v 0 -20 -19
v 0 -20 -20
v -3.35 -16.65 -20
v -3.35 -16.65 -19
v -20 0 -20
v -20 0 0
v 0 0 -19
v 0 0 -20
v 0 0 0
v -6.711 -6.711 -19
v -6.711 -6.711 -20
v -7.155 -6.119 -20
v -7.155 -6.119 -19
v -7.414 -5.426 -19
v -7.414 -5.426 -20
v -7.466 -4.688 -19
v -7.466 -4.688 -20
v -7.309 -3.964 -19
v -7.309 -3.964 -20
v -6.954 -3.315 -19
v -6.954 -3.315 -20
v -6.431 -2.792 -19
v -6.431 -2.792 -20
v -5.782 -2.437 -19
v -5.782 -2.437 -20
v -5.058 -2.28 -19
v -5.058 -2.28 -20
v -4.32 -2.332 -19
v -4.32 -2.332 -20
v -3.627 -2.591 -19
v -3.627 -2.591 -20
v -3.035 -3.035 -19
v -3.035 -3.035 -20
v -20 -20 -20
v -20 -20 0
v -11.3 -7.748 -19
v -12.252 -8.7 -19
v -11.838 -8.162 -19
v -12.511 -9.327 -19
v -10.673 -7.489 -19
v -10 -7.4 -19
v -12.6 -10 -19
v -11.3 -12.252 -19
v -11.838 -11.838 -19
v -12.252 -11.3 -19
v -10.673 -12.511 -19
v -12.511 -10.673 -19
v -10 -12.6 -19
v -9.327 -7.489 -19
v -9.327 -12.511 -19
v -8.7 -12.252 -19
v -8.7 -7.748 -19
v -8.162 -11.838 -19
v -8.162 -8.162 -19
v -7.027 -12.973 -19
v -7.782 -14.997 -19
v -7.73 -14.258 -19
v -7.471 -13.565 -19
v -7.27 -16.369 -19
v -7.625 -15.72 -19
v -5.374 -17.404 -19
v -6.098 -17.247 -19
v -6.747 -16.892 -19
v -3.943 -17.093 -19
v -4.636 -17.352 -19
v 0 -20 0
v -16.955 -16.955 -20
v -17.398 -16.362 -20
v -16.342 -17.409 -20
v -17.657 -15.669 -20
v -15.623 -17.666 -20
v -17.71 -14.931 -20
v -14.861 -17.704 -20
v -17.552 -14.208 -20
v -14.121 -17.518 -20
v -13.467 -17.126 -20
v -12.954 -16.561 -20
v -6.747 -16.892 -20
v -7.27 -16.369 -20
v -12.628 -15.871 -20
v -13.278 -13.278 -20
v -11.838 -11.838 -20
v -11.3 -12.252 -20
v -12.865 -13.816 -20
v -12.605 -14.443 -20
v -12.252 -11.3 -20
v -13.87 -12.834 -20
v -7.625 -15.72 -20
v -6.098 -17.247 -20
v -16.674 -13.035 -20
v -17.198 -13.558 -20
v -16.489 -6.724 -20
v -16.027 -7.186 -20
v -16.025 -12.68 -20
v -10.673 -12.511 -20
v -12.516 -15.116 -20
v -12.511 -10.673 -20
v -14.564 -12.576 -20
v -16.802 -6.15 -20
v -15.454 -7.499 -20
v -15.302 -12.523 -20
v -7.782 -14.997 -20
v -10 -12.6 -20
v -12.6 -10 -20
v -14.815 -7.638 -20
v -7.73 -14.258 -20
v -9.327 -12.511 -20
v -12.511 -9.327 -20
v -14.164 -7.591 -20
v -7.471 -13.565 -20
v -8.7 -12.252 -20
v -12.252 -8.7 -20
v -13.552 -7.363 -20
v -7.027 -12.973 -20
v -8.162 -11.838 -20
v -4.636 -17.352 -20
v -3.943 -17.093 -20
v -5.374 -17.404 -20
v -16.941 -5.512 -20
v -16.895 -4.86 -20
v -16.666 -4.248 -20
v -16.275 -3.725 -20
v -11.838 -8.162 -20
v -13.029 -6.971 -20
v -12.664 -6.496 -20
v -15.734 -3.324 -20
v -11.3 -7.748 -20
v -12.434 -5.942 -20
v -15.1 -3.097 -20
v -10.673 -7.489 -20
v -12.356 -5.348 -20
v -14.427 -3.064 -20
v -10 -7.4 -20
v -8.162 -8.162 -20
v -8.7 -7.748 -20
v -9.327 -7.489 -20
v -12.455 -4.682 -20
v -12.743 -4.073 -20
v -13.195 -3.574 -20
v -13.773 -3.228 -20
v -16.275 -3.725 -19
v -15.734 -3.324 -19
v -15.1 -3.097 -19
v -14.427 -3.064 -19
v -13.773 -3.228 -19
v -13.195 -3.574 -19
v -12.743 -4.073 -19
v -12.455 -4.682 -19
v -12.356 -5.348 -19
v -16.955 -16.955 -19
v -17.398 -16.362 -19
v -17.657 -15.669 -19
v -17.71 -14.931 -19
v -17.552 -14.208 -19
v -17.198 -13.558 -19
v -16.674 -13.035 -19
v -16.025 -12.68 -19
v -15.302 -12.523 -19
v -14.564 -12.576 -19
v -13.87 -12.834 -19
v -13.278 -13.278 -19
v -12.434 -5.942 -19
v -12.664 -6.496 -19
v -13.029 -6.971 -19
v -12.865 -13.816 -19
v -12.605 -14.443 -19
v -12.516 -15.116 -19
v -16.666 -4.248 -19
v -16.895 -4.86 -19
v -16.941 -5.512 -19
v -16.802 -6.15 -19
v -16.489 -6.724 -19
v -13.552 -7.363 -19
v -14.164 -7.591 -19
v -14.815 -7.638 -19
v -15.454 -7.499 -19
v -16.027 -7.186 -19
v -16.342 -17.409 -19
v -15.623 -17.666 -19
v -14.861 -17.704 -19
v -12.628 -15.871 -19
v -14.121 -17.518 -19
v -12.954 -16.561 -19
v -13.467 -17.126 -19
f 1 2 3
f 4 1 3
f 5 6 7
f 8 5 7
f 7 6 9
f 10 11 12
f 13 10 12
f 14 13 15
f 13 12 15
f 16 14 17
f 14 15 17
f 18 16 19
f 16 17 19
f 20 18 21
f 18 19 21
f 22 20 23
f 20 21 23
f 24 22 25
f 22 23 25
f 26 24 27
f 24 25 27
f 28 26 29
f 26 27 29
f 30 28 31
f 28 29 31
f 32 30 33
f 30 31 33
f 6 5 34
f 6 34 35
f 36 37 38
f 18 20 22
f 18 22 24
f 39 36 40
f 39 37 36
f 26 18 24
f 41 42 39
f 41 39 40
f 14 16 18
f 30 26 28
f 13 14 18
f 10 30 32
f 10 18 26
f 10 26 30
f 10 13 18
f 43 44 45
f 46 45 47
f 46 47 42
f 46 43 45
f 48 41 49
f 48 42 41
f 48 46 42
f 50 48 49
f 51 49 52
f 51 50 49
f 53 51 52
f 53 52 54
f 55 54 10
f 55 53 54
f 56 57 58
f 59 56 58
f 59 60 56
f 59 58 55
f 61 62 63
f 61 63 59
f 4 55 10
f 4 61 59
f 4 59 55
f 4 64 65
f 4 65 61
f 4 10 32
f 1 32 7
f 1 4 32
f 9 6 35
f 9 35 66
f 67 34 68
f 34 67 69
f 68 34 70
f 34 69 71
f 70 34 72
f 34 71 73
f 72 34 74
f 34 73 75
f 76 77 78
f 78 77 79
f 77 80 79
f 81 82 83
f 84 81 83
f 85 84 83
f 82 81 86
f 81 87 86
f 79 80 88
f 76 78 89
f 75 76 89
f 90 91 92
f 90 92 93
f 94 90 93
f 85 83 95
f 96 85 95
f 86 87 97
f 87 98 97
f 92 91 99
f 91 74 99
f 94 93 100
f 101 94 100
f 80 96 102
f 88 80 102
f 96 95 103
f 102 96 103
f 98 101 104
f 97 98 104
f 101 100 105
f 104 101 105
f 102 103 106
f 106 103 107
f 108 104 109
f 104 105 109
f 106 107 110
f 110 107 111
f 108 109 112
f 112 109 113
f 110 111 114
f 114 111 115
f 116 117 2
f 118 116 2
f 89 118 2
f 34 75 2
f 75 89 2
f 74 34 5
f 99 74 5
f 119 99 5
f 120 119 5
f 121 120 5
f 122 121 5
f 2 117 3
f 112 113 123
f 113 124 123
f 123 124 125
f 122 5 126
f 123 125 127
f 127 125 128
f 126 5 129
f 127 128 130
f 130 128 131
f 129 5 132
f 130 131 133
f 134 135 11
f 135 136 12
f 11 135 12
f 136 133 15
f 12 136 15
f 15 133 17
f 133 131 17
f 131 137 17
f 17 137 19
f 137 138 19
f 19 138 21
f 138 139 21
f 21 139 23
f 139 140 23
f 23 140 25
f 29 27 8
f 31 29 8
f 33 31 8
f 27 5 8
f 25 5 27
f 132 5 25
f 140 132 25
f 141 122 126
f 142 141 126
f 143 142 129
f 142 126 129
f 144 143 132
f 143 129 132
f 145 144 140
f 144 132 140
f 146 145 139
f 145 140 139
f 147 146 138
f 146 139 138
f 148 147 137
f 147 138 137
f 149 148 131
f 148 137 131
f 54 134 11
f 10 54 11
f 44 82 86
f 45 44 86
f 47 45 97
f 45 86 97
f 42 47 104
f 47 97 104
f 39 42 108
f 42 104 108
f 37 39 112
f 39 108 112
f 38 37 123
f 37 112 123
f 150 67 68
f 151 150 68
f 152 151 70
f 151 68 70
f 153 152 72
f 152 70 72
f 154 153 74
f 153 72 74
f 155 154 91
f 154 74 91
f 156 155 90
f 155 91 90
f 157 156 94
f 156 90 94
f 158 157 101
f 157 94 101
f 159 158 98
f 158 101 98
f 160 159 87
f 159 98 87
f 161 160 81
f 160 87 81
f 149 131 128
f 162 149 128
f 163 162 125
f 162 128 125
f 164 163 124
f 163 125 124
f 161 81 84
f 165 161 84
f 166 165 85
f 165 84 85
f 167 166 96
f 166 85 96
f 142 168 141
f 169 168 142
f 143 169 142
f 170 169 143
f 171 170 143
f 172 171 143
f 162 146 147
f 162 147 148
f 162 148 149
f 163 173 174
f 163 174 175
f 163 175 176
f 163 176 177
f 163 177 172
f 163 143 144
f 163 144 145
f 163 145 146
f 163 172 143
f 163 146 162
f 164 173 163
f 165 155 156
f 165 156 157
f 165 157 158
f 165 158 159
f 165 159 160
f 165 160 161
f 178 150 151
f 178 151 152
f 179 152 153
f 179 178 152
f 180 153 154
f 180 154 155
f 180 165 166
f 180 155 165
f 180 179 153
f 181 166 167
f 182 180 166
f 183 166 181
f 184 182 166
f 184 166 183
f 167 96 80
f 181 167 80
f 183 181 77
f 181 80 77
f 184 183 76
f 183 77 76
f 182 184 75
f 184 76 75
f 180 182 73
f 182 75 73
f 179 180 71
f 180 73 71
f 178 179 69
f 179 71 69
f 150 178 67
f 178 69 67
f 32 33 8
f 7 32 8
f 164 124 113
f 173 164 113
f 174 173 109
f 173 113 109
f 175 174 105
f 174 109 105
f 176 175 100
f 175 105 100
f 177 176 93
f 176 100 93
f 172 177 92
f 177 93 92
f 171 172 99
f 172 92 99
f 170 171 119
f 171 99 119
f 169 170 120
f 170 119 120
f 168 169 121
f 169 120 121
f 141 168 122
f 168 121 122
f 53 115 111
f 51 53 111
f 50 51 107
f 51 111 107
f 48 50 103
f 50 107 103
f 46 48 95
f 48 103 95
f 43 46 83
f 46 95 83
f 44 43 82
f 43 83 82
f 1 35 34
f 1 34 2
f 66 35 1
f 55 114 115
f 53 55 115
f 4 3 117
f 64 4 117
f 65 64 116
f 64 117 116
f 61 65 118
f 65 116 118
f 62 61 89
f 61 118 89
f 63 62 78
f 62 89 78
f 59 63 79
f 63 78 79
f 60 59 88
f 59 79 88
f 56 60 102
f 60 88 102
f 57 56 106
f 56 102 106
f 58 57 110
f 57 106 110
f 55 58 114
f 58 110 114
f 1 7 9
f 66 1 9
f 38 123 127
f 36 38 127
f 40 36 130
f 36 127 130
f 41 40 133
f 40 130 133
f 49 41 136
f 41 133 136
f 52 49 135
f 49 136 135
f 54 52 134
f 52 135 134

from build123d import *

# Parameters (mm, degrees)
F0_W     = 20
F0_H     = 20
F1_DEPTH = 20
F3_DEPTH = 1


with BuildPart() as f1:
    # F0 (on Front) → F1 (new body)
    with BuildSketch(Plane.XZ):
        with Locations((-10, -10)):
            Rectangle(F0_W, F0_H)
    extrude(amount=F1_DEPTH)

    # F2 (on face) → F3 (cut)
    with BuildSketch(Plane(origin=(0, 0, -20), x_dir=(1, 0, 0), z_dir=(0, 0, -1))):
        with BuildLine():
            ThreePointArc((-13.0285681023, 6.9714318977), (-16.2748573364, 6.9714318977), (-16.2748573364, 3.7251426636))
            Line((-16.2748573364, 3.7251426636), (-13.0285681023, 6.9714318977))
        make_face()
        with BuildLine():
            ThreePointArc((-16.9547054218, 16.9547054218), (-16.9547054218, 13.2777501596), (-13.2777501596, 13.2777501596))
            Line((-13.2777501596, 13.2777501596), (-16.9547054218, 16.9547054218))
        make_face()
        with BuildLine():
            Line((-16.9547054218, 16.9547054218), (-13.2777501596, 13.2777501596))
            ThreePointArc((-13.2777501596, 13.2777501596), (-12.7141410062, 14.1212508666), (-12.5162277907, 15.1162277907))
            ThreePointArc((-12.5162277907, 15.1162277907), (-14.1212508666, 17.5183145752), (-16.9547054218, 16.9547054218))
        make_face()
        with BuildLine():
            ThreePointArc((-11.8384776311, 11.8384776311), (-12.6, 10), (-11.8384776311, 8.1615223689))
            Line((-11.8384776311, 8.1615223689), (-10, 10))
            Line((-10, 10), (-11.8384776311, 11.8384776311))
        make_face()
        with BuildLine():
            Line((-10, 10), (-11.8384776311, 8.1615223689))
            ThreePointArc((-11.8384776311, 8.1615223689), (-10, 7.4), (-8.1615223689, 8.1615223689))
            Line((-8.1615223689, 8.1615223689), (-10, 10))
        make_face()
        with BuildLine():
            Line((-13.0285681023, 6.9714318977), (-16.2748573364, 3.7251426636))
            ThreePointArc((-16.2748573364, 3.7251426636), (-13.7732731826, 3.2275466374), (-12.3562395882, 5.3482872806))
            ThreePointArc((-12.3562395882, 5.3482872806), (-12.5309720761, 6.2267268174), (-13.0285681023, 6.9714318977))
        make_face()
        with BuildLine():
            Line((-11.8384776311, 11.8384776311), (-10, 10))
            Line((-10, 10), (-8.1615223689, 11.8384776311))
            ThreePointArc((-8.1615223689, 11.8384776311), (-10, 12.6), (-11.8384776311, 11.8384776311))
        make_face()
        with BuildLine():
            Line((-8.1615223689, 11.8384776311), (-10, 10))
            Line((-10, 10), (-8.1615223689, 8.1615223689))
            ThreePointArc((-8.1615223689, 8.1615223689), (-7.5979132155, 9.0050230759), (-7.4, 10))
            ThreePointArc((-7.4, 10), (-7.5979132155, 10.9949769241), (-8.1615223689, 11.8384776311))
        make_face()
        with BuildLine():
            ThreePointArc((-7.4, 10), (-7.5979132155, 9.0050230759), (-8.1615223689, 8.1615223689))
            Line((-8.1615223689, 8.1615223689), (-6.7114877282, 6.7114877282))
            ThreePointArc((-6.7114877282, 6.7114877282), (-3.8780331729, 7.2750968816), (-2.2730100971, 4.8730100971))
            ThreePointArc((-2.2730100971, 4.8730100971), (-2.4709233125, 3.8780331729), (-3.034532466, 3.034532466))
            Line((-3.034532466, 3.034532466), (0, 0))
            Line((0, 0), (0, 20))
            Line((0, 20), (-3.3504526736, 16.6495473264))
            ThreePointArc((-3.3504526736, 16.6495473264), (-2.7868435202, 15.8060466194), (-2.5889303047, 14.8110696953))
            ThreePointArc((-2.5889303047, 14.8110696953), (-4.1939533806, 12.4089829107), (-7.0274079358, 12.9725920642))
            Line((-7.0274079358, 12.9725920642), (-8.1615223689, 11.8384776311))
            ThreePointArc((-8.1615223689, 11.8384776311), (-7.5979132155, 10.9949769241), (-7.4, 10))
        make_face()
        with BuildLine():
            ThreePointArc((-2.2730100971, 4.8730100971), (-3.8780331729, 7.2750968816), (-6.7114877282, 6.7114877282))
            Line((-6.7114877282, 6.7114877282), (-3.034532466, 3.034532466))
            ThreePointArc((-3.034532466, 3.034532466), (-2.4709233125, 3.8780331729), (-2.2730100971, 4.8730100971))
        make_face()
        with BuildLine():
            Line((-3.034532466, 3.034532466), (-6.7114877282, 6.7114877282))
            ThreePointArc((-6.7114877282, 6.7114877282), (-6.7114877282, 3.034532466), (-3.034532466, 3.034532466))
        make_face()
        with BuildLine():
            ThreePointArc((-3.3504526736, 16.6495473264), (-7.0274079358, 16.6495473264), (-7.0274079358, 12.9725920642))
            Line((-7.0274079358, 12.9725920642), (-3.3504526736, 16.6495473264))
        make_face()
        with BuildLine():
            Line((-3.3504526736, 16.6495473264), (-7.0274079358, 12.9725920642))
            ThreePointArc((-7.0274079358, 12.9725920642), (-4.1939533806, 12.4089829107), (-2.5889303047, 14.8110696953))
            ThreePointArc((-2.5889303047, 14.8110696953), (-2.7868435202, 15.8060466194), (-3.3504526736, 16.6495473264))
        make_face()
    extrude(amount=-F3_DEPTH, mode=Mode.SUBTRACT)


solid = f1.part
